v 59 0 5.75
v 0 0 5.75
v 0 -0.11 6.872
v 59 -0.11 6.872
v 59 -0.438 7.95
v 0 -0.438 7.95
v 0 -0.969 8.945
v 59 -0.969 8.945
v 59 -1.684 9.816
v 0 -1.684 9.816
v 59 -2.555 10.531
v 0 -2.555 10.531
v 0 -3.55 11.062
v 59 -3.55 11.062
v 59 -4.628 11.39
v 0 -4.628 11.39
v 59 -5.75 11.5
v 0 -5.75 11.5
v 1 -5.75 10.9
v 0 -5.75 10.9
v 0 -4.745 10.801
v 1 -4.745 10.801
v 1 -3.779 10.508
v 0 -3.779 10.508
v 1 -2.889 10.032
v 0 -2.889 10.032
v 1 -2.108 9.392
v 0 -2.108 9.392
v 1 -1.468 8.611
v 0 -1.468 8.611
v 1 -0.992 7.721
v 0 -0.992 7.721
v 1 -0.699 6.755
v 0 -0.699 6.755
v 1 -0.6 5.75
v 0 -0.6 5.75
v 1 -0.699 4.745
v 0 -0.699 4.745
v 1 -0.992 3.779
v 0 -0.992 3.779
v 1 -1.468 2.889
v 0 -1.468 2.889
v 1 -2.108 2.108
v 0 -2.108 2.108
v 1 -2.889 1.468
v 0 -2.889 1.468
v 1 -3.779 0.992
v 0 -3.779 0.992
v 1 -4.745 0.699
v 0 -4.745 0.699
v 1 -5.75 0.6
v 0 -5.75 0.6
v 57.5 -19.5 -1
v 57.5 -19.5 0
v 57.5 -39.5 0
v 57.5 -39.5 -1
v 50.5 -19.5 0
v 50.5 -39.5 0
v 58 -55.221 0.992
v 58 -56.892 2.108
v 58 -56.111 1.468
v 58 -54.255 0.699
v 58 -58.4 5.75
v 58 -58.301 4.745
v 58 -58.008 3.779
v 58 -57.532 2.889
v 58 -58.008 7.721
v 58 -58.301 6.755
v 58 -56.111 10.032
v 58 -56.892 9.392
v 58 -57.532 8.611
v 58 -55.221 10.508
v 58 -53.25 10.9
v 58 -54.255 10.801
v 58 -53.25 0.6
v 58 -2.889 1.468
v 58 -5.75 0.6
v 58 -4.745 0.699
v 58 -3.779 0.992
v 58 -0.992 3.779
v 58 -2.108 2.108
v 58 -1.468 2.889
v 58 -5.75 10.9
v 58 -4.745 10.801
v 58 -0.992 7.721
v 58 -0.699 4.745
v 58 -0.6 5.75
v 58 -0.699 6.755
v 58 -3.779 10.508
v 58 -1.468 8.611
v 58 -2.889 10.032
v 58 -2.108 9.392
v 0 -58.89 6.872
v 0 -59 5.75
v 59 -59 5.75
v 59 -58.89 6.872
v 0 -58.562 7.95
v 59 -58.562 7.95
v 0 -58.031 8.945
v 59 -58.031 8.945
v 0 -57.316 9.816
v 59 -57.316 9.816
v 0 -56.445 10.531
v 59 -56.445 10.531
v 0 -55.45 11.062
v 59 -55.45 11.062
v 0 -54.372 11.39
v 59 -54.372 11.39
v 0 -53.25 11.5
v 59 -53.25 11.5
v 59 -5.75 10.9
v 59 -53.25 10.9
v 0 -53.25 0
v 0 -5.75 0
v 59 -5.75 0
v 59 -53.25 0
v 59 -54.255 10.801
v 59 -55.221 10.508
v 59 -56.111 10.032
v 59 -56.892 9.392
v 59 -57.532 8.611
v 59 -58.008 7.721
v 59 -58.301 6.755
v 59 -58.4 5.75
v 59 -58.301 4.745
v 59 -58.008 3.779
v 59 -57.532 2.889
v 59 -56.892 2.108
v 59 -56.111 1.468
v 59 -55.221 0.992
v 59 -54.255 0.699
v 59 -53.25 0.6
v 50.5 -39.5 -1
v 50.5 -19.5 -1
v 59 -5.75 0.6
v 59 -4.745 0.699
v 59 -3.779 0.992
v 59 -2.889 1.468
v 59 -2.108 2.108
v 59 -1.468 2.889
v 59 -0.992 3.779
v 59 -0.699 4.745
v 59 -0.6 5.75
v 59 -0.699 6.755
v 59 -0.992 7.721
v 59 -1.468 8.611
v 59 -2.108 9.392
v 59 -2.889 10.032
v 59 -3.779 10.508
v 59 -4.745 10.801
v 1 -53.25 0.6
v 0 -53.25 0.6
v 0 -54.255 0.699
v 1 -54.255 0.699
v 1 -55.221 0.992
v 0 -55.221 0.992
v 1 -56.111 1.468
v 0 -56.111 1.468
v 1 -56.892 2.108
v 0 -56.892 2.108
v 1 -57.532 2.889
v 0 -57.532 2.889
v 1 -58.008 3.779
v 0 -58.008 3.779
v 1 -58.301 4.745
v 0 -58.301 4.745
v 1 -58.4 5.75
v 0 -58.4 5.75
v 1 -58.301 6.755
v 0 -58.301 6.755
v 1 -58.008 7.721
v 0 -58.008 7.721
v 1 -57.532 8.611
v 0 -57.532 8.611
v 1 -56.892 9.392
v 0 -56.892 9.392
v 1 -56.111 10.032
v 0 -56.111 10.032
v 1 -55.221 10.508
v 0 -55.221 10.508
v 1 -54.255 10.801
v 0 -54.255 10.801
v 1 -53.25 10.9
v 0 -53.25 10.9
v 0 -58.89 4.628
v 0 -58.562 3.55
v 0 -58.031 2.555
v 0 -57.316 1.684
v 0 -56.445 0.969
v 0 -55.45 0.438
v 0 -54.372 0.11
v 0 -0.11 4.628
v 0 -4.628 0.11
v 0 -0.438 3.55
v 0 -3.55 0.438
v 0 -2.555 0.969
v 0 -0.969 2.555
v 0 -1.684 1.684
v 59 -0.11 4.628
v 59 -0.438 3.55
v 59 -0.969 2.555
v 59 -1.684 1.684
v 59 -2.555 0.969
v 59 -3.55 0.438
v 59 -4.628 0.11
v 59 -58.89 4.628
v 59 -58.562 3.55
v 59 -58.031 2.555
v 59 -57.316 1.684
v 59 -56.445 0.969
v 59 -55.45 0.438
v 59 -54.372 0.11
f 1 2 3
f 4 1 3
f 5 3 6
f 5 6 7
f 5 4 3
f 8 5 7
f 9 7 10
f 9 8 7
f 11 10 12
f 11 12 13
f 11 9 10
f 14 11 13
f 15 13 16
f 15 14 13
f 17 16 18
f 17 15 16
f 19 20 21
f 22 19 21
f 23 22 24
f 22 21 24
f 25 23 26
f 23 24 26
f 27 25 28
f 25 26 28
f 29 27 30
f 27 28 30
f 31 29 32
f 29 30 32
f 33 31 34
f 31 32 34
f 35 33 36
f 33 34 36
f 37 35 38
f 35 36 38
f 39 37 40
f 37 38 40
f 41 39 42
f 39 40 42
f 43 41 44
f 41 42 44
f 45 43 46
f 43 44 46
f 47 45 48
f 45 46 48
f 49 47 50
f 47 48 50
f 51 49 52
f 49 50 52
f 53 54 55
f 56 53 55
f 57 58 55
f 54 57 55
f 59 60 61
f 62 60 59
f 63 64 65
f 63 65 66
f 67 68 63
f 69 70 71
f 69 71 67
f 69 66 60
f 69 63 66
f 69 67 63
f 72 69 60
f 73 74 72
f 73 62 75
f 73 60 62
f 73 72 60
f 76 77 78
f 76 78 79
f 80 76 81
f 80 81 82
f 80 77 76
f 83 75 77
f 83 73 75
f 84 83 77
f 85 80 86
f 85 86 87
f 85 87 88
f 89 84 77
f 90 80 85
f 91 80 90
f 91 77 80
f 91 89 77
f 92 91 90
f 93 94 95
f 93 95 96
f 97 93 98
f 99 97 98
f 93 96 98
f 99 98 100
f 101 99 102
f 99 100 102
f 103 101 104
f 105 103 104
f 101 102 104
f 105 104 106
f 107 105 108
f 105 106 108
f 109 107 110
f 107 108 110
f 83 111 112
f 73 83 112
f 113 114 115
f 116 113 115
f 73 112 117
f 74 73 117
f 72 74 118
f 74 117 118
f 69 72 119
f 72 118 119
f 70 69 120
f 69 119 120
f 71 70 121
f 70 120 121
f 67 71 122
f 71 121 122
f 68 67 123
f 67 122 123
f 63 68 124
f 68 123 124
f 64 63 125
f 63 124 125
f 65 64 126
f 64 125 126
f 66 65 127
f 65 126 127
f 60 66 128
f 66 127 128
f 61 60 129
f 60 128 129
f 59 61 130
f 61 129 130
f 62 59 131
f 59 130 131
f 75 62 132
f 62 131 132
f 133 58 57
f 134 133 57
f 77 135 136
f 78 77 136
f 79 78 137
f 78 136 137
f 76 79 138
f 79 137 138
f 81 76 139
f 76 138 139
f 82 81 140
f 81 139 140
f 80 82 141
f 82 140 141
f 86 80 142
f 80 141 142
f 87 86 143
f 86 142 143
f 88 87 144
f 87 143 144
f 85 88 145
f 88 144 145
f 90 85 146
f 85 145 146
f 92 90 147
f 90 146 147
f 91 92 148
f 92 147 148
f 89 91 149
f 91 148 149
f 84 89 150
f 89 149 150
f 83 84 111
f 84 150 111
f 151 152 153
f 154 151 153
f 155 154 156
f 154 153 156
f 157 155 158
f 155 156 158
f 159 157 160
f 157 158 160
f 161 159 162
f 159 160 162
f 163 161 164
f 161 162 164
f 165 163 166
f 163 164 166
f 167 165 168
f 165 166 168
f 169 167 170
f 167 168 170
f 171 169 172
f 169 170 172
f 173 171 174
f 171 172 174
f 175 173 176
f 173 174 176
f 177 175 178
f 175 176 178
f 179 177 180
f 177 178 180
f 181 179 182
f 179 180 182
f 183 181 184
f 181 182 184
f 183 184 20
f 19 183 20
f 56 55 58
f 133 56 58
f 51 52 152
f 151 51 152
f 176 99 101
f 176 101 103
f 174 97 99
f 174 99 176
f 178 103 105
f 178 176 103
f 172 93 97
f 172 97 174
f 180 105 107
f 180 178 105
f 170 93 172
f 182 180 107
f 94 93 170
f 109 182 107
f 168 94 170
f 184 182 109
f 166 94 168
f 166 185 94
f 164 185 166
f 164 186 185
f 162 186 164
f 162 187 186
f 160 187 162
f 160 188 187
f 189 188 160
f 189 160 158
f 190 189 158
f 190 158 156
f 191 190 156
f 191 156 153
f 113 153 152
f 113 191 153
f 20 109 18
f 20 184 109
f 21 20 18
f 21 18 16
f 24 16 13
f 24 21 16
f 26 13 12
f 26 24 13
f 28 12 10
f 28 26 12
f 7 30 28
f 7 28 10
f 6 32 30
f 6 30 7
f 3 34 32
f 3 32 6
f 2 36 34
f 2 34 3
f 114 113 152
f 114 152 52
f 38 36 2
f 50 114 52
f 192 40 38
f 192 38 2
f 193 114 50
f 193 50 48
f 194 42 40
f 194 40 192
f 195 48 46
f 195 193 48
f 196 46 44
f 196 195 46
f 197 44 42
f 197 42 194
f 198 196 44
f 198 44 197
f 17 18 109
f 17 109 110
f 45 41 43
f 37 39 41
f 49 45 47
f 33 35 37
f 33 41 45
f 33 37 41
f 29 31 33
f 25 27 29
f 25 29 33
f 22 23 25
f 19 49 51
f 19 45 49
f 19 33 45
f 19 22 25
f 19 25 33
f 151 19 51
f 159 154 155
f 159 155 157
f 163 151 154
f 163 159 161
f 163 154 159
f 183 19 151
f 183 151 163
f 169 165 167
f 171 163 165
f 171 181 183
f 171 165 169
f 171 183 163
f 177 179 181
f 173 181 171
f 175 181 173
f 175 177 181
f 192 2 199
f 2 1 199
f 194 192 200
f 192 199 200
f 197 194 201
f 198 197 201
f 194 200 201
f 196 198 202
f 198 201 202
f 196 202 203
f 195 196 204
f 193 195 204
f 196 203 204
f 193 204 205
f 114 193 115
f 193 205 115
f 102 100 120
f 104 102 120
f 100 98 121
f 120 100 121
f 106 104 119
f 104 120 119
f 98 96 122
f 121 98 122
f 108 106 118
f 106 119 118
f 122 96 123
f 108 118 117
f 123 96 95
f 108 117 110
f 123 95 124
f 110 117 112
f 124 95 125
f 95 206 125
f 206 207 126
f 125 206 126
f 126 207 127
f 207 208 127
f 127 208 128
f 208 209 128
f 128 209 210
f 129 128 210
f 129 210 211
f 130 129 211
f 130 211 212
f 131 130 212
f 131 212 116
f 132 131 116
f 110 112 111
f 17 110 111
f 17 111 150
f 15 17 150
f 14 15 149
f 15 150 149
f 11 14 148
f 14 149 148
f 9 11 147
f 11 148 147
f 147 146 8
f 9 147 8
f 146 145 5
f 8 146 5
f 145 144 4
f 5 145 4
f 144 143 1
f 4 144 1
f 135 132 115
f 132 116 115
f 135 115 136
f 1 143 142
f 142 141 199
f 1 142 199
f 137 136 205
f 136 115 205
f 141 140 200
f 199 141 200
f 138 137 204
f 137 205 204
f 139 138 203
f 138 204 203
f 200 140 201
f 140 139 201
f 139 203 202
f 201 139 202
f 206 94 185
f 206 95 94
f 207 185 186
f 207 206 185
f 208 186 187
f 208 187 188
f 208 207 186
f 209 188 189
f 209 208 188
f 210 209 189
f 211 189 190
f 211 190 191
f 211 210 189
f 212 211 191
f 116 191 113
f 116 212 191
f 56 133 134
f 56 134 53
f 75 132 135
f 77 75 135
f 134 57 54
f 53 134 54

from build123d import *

# Parameters (mm, degrees)
F0_W     = 59
F0_H     = 59
F1_DEPTH = 11.5
F2_R     = 5.74999
F4_DEPTH = 1
F6_DEPTH = 1
F8_DEPTH = 1


# Not quite as in the source:
# - a fillet or chamfer is up to 0.001 mm smaller than in the source, because OpenCascade refuses the exact size


with BuildPart() as f1:
    # F0 (on Top) → F1 (new body)
    with BuildSketch(Plane.XY):
        with Locations((29.5, -29.5)):
            Rectangle(F0_W, F0_H)
    extrude(amount=F1_DEPTH)

    # F2 (radius 5.75 in the source; OpenCascade refuses exactly that, so slightly less here)
    f2_edges = [f1.edges().sort_by_distance(p)[0] for p in [
        (29.5, -59, 11.5),
        (29.5, -59, 0),
        (29.5, 0, 11.5),
        (29.5, 0, 0),
    ]]
    fillet(f2_edges, radius=F2_R)

    # F3 (on face) → F4 (cut)
    with BuildSketch(Plane.YZ.offset(59)):
        with BuildLine():
            ThreePointArc((-5.75, 0.5999998897), (-0.5999998897, 5.75), (-5.75, 10.9000001103))
            Line((-5.75, 10.9000001103), (-53.25, 10.9000001103))
            ThreePointArc((-53.25, 10.9000001103), (-58.4000001103, 5.75), (-53.25, 0.5999998897))
            Line((-53.25, 0.5999998897), (-5.75, 0.5999998897))
        make_face()
    extrude(amount=-F4_DEPTH, mode=Mode.SUBTRACT)

    # F5 (on face) → F6 (cut)
    with BuildSketch(Plane(origin=(0, 0, 0), x_dir=(0, -1, 0), z_dir=(-1, 0, 0))):
        with BuildLine():
            Line((53.25, 10.9), (5.75, 10.9))
            ThreePointArc((5.75, 10.9), (0.6, 5.75), (5.75, 0.6))
            Line((5.75, 0.6), (53.25, 0.6))
            ThreePointArc((53.25, 0.6), (58.4, 5.75), (53.25, 10.9))
        make_face()
    extrude(amount=-F6_DEPTH, mode=Mode.SUBTRACT)


with BuildPart() as f8:
    # F7 (on face) → F8 (new body)
    with BuildSketch(Plane(origin=(0, 0, 0), x_dir=(1, 0, 0), z_dir=(0, 0, -1))):
        Polygon((57.5, 39.5), (50.5, 39.5), (50.5, 19.5), (57.5, 19.5), (57.5, 29.5), align=None)
    extrude(amount=F8_DEPTH)


solid = Compound([f1.part, f8.part])
